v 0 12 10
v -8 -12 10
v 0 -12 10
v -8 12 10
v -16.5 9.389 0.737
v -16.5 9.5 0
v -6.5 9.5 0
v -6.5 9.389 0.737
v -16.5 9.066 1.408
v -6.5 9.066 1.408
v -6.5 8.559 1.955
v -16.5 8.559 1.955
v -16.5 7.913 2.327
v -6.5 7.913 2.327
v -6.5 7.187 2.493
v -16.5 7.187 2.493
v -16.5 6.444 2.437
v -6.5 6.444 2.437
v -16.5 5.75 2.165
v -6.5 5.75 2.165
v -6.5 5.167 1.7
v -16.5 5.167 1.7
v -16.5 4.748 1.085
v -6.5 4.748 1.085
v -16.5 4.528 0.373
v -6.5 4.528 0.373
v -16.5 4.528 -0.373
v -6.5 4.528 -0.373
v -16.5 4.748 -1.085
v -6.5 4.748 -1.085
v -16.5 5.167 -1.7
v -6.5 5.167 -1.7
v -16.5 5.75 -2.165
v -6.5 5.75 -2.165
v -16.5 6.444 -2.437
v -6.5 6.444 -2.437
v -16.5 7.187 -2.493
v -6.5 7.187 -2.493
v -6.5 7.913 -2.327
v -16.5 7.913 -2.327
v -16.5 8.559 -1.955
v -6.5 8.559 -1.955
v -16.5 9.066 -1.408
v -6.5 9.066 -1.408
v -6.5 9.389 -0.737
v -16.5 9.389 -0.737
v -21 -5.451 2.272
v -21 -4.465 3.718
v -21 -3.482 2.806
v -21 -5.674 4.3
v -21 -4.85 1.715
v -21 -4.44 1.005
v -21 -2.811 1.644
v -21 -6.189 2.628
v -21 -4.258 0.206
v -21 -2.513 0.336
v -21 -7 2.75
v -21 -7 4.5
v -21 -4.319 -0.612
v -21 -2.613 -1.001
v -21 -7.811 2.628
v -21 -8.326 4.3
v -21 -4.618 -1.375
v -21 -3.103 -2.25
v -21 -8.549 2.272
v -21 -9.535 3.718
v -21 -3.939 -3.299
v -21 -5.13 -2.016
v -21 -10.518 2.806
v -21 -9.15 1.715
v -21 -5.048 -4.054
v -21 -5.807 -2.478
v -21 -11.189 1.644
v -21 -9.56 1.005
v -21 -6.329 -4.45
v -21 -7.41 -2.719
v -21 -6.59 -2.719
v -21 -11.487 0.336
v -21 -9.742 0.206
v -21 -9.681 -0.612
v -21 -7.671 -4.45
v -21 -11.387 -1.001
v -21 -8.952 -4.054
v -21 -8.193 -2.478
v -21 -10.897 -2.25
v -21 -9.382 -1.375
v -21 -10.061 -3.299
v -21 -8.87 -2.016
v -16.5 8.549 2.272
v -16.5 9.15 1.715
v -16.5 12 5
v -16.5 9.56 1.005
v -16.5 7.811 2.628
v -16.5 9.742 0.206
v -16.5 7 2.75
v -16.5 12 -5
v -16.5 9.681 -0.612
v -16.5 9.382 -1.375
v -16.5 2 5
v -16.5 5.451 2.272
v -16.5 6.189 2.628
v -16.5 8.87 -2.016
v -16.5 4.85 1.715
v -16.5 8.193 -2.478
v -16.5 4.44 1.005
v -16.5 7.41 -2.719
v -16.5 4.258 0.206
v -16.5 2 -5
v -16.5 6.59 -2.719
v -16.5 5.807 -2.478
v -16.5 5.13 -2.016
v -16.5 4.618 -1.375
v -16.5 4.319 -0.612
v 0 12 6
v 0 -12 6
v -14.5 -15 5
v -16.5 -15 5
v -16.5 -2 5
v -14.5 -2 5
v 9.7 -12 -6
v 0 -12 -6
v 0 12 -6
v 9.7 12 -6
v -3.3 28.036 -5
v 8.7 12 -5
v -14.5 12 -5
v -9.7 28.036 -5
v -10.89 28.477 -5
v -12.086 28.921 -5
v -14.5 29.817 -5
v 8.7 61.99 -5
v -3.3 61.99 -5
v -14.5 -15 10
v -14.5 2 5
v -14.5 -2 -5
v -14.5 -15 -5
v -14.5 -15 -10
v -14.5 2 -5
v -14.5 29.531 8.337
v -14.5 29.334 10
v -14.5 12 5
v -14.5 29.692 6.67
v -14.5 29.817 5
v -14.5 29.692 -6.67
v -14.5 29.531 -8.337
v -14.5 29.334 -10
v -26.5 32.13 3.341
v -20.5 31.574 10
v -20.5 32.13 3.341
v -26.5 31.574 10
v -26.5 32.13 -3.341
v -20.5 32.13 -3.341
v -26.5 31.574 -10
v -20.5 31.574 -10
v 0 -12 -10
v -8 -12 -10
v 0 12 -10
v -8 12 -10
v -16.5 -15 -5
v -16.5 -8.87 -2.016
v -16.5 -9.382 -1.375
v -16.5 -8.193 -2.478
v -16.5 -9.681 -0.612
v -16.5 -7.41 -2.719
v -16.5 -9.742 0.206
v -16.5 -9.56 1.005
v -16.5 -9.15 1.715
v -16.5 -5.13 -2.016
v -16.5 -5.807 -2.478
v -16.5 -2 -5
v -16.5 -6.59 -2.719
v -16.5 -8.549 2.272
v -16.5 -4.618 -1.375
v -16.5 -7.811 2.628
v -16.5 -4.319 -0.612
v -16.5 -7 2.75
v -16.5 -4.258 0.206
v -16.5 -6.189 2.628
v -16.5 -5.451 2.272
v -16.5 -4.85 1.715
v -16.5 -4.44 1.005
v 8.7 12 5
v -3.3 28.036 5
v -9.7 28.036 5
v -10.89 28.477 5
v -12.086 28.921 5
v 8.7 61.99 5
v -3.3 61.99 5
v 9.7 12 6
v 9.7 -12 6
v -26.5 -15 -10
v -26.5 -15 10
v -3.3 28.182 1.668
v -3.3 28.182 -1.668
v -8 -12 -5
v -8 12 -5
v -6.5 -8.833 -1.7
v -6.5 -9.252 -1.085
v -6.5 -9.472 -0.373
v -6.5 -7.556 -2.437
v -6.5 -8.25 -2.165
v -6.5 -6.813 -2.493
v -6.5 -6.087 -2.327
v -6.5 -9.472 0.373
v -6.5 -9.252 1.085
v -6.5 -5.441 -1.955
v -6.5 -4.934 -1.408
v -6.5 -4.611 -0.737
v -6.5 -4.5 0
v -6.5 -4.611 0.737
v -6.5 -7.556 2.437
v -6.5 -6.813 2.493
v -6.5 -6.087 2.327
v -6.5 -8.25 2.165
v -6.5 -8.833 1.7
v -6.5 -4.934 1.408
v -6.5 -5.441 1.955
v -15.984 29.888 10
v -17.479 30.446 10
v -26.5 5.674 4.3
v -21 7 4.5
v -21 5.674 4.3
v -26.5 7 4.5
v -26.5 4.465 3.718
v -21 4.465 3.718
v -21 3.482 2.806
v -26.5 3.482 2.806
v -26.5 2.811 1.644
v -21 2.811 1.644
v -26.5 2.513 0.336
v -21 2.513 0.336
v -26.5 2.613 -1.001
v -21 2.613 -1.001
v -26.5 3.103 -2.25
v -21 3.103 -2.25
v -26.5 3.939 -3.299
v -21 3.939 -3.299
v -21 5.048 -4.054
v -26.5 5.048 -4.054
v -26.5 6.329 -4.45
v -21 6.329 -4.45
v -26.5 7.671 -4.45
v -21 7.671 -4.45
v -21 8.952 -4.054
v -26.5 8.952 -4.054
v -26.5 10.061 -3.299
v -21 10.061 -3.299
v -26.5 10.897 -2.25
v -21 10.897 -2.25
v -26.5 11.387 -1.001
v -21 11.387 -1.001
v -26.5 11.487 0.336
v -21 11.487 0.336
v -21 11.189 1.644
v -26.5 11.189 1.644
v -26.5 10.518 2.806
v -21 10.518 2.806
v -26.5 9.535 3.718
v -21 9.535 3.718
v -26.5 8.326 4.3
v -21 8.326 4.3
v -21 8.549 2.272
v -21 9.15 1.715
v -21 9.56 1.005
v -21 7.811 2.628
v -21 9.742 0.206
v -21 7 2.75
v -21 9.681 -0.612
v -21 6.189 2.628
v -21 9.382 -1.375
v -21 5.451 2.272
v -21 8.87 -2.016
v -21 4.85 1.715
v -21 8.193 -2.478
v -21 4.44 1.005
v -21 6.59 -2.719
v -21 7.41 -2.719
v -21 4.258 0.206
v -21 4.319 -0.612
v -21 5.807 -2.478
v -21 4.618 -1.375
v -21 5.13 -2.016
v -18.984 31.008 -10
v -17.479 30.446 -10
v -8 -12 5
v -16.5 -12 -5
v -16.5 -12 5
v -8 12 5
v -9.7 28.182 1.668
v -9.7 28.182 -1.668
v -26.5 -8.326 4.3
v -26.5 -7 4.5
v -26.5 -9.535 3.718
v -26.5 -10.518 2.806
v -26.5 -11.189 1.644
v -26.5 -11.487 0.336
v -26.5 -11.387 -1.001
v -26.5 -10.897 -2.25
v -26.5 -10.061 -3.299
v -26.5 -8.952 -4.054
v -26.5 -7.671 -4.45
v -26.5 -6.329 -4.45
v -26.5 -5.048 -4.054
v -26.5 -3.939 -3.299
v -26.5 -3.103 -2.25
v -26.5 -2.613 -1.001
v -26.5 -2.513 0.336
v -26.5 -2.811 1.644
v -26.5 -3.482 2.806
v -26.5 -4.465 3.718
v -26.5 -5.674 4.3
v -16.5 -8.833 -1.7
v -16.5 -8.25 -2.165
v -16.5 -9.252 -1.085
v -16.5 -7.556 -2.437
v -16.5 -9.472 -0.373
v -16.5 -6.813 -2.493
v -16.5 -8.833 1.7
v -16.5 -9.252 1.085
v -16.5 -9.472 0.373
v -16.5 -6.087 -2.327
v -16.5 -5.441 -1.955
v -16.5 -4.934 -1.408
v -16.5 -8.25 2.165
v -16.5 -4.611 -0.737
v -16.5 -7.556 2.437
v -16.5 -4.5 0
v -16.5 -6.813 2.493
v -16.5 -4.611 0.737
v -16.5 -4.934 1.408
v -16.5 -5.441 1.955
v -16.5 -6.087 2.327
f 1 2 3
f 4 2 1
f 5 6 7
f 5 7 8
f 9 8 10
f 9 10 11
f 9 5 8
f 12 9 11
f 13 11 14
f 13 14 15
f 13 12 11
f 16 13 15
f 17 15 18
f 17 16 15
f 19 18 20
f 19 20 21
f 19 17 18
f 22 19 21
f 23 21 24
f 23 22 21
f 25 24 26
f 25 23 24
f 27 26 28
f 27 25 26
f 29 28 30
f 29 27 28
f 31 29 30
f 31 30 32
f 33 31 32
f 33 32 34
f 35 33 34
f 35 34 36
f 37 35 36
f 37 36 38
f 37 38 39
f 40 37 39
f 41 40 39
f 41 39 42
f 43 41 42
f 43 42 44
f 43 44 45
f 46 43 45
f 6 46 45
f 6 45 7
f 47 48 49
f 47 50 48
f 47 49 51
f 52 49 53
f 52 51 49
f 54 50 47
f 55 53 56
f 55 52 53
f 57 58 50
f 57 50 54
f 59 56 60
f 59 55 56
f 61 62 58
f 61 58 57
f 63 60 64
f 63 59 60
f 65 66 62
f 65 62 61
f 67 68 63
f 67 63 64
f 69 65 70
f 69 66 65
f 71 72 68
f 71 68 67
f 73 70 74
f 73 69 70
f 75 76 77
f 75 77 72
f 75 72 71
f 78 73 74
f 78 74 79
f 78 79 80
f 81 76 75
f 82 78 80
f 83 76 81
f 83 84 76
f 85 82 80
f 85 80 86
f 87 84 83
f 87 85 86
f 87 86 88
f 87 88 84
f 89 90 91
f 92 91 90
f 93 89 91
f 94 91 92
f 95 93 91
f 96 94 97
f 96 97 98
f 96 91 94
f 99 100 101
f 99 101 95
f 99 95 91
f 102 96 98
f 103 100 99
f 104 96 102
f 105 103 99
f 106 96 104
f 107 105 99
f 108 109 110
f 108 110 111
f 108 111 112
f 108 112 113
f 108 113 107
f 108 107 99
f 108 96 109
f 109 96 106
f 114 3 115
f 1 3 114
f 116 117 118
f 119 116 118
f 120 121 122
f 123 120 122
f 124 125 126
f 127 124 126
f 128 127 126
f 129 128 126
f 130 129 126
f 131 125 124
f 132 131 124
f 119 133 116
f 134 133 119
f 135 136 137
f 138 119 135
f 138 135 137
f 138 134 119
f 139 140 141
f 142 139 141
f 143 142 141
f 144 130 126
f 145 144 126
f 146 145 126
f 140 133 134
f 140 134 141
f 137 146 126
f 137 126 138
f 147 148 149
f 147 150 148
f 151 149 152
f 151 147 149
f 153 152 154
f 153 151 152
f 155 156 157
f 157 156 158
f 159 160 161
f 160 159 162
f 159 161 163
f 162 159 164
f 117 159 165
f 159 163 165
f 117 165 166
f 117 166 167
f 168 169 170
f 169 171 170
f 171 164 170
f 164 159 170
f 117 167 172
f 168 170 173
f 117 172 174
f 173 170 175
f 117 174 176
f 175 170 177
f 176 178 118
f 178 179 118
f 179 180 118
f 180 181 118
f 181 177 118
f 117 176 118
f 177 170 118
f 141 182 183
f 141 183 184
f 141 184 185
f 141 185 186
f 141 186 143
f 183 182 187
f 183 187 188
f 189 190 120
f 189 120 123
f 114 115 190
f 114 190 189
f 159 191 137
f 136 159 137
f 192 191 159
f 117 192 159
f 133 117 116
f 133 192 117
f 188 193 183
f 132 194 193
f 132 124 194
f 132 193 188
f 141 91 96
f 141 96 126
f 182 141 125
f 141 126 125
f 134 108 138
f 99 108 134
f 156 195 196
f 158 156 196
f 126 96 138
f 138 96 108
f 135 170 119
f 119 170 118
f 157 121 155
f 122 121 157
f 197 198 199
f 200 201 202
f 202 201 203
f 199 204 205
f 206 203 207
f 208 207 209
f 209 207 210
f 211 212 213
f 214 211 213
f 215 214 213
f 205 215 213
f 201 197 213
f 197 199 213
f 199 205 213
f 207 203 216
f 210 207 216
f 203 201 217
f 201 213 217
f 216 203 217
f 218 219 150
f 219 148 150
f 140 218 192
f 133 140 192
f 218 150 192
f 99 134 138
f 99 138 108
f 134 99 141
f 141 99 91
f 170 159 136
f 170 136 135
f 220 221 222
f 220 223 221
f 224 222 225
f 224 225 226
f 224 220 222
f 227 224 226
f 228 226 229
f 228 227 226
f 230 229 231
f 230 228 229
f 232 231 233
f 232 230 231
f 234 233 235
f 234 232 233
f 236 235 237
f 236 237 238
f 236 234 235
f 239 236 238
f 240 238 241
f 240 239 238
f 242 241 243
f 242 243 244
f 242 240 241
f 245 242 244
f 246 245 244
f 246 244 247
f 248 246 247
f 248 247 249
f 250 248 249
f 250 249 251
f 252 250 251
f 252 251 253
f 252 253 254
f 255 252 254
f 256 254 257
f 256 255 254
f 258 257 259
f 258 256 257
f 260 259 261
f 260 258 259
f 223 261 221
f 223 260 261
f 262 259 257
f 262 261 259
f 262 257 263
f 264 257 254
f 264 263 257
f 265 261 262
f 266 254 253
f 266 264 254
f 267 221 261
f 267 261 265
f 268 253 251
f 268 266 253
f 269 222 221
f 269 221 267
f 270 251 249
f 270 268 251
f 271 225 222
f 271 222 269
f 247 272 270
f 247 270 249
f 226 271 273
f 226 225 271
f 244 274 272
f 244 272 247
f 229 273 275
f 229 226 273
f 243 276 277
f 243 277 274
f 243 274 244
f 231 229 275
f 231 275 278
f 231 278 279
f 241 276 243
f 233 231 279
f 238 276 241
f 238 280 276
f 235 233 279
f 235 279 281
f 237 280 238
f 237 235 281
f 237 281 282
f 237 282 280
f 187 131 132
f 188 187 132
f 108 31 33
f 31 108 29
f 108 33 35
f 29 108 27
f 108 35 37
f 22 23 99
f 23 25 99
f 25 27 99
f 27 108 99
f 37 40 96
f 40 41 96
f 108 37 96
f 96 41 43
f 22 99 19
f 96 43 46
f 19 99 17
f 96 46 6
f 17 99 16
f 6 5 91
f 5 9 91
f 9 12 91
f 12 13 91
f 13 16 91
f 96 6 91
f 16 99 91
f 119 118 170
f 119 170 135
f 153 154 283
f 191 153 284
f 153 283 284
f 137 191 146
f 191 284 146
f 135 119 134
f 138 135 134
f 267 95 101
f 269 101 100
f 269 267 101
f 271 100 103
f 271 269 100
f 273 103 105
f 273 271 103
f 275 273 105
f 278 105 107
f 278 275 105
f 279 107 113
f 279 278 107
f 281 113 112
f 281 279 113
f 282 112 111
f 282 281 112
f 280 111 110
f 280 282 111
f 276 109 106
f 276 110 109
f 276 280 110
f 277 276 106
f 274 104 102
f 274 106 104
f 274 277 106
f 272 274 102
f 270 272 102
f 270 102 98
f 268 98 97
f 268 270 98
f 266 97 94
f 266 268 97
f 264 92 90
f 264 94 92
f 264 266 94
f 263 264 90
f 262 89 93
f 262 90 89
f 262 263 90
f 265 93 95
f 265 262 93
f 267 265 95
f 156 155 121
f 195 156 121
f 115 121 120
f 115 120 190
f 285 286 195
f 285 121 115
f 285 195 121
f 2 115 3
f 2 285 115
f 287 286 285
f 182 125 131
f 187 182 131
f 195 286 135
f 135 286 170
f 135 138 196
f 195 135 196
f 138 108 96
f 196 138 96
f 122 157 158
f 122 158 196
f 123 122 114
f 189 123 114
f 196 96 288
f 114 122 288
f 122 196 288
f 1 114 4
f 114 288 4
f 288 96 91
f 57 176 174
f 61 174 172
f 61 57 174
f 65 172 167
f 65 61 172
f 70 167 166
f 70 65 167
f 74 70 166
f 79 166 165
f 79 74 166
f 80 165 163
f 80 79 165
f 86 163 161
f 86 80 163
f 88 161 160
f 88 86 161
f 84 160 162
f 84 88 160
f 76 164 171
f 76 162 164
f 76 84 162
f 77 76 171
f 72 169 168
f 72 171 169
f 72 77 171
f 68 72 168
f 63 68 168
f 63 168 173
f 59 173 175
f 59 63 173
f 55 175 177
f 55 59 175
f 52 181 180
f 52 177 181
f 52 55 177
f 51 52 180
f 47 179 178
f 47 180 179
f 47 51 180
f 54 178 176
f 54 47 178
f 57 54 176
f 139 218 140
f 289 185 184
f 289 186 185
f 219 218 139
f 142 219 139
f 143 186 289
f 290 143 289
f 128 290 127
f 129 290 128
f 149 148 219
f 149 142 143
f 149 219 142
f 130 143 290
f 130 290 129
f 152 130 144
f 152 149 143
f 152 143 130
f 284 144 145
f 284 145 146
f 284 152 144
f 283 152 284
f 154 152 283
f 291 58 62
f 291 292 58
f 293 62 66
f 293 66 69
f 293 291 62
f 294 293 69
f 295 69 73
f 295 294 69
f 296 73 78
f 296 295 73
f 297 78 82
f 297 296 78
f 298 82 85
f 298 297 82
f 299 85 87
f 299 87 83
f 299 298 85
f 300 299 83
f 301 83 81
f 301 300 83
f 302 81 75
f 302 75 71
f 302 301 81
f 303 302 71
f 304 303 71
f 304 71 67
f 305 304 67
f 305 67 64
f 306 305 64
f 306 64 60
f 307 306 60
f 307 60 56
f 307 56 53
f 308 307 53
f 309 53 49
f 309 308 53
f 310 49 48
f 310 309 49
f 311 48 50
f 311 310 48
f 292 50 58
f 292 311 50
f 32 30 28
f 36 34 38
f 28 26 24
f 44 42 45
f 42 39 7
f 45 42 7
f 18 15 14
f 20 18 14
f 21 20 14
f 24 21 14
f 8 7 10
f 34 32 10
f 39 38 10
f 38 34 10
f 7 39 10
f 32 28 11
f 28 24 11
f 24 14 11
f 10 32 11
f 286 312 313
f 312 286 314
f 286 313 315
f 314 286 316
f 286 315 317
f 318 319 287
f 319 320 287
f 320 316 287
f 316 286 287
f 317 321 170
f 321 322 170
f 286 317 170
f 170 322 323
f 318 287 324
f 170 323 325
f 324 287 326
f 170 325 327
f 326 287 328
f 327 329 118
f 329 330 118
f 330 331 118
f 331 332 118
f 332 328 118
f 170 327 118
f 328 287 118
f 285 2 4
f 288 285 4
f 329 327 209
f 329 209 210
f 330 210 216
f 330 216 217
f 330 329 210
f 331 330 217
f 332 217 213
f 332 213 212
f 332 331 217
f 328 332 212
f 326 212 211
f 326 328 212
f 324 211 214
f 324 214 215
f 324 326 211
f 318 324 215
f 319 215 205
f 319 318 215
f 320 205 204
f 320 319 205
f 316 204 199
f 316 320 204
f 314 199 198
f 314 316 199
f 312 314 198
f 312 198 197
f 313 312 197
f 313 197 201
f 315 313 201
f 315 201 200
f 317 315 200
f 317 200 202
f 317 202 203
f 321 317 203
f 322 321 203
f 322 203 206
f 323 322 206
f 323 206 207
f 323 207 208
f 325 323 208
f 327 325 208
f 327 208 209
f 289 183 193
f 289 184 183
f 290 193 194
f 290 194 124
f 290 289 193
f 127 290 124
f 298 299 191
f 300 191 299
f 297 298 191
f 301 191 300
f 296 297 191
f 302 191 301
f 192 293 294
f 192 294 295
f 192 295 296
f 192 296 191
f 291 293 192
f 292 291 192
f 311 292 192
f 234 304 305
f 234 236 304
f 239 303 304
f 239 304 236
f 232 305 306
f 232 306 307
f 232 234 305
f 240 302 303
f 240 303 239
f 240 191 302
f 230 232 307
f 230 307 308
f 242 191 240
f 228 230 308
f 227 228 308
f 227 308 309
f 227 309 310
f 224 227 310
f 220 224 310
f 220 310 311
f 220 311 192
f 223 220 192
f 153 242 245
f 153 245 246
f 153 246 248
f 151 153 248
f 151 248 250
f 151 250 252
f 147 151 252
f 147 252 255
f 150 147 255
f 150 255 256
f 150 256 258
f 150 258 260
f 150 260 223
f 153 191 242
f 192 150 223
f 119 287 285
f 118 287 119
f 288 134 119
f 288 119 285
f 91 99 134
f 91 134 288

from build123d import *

# Parameters (mm, degrees)
MHSL3_50D_MHSL_FINGER_START       = -14.5
MHSL3_50D_MHSL_FINGER_OUTLINE_W   = 24
MHSL3_50D_MHSL_FINGER_OUTLINE_H   = 10
MHSL3_50D_MHSL_FINGER_OUTLINE_R   = 2.5
MHSL3_50D_MHSL_FINGER_DEPTH       = 24.2
MHSL3_50D_MHSL_FINGER_START_2     = -8
MHSL3_50D_MHSL_FINGER_2_OUTLINE_W = 24
MHSL3_50D_MHSL_FINGER_2_OUTLINE_H = 5
MHSL3_50D_MHSL_FINGER_2_DEPTH     = 8
MHSL3_50D_MHSL_FINGER_START_3     = -6.5
MHSL3_50D_MHSL_FINGER_3_OUTLINE_W = 24
MHSL3_50D_MHSL_FINGER_3_OUTLINE_H = 1
MHSL3_50D_MHSL_FINGER_3_OUTLINE_R = 2.5
MHSL3_50D_MHSL_FINGER_3_DEPTH     = 16.2
MHSL3_50D_MHSL_FINGER_START_4     = -16.5
MHSL3_50D_MHSL_FINGER_4_OUTLINE_W = 10
MHSL3_50D_MHSL_FINGER_4_OUTLINE_H = 10
MHSL3_50D_MHSL_FINGER_4_OUTLINE_R = 2.5
MHSL3_50D_MHSL_FINGER_4_DEPTH     = 2
BOSS_EXTRUDE2_DEPTH               = 5
BOSS_EXTRUDE2_DEPTH_BACK          = 5
CBORE_FOR_M5_SHCS5_AT_2_COUNT     = 2
CBORE_FOR_M5_SHCS5_AT_2_PITCH     = 14
BOSS_EXTRUDE3_DEPTH               = 10
BOSS_EXTRUDE4_DEPTH               = 5
SKETCH18_W                        = 10
SKETCH18_H                        = 20
BOSS_EXTRUDE5_DEPTH               = 3
SKETCH21_W                        = 5
SKETCH21_H                        = 13
BOSS_EXTRUDE7_DEPTH               = 2


# Read off the part's stored shape, not the designer's step: MHSL3-50D_MHSL-Finger
with BuildPart() as part:
    # MHSL3-50D_MHSL-Finger outline → MHSL3-50D_MHSL-Finger (new body)
    with BuildSketch(Plane.YZ.offset(MHSL3_50D_MHSL_FINGER_START)):
        Rectangle(MHSL3_50D_MHSL_FINGER_OUTLINE_W, MHSL3_50D_MHSL_FINGER_OUTLINE_H)
        with Locations((7, 0)):
            Circle(MHSL3_50D_MHSL_FINGER_OUTLINE_R, mode=Mode.SUBTRACT)
        with Locations((-7, 0)):
            Circle(MHSL3_50D_MHSL_FINGER_OUTLINE_R, mode=Mode.SUBTRACT)
    extrude(amount=MHSL3_50D_MHSL_FINGER_DEPTH)



with BuildPart() as body_2:
    # MHSL3-50D_MHSL-Finger 2 outline → MHSL3-50D_MHSL-Finger 2 (new body)
    with BuildSketch(Plane.YZ.offset(MHSL3_50D_MHSL_FINGER_START_2)):
        with Locations((0, 7.5)):
            Rectangle(MHSL3_50D_MHSL_FINGER_2_OUTLINE_W, MHSL3_50D_MHSL_FINGER_2_OUTLINE_H)
        with Locations((0, -7.5)):
            Rectangle(MHSL3_50D_MHSL_FINGER_2_OUTLINE_W, MHSL3_50D_MHSL_FINGER_2_OUTLINE_H)
    extrude(amount=MHSL3_50D_MHSL_FINGER_2_DEPTH)


with BuildPart() as part_1:
    add(part.part)

    add(body_2.part)  # MHSL3-50D_MHSL-Finger 3 merges body 2
    # MHSL3-50D_MHSL-Finger 3 outline → MHSL3-50D_MHSL-Finger 3 (add)
    with BuildSketch(Plane.YZ.offset(MHSL3_50D_MHSL_FINGER_START_3)):
        with Locations((0, 5.5)):
            Rectangle(MHSL3_50D_MHSL_FINGER_3_OUTLINE_W, MHSL3_50D_MHSL_FINGER_3_OUTLINE_H)
        with Locations((0, -5.5)):
            Rectangle(MHSL3_50D_MHSL_FINGER_3_OUTLINE_W, MHSL3_50D_MHSL_FINGER_3_OUTLINE_H)
        with Locations((7, 0)):
            Circle(MHSL3_50D_MHSL_FINGER_3_OUTLINE_R)
        with Locations((-7, 0)):
            Circle(MHSL3_50D_MHSL_FINGER_3_OUTLINE_R)
    extrude(amount=MHSL3_50D_MHSL_FINGER_3_DEPTH)

    # MHSL3-50D_MHSL-Finger 4 outline → MHSL3-50D_MHSL-Finger 4 (add)
    # profile 1 of 2: a face of its own
    with BuildSketch(Plane.YZ.offset(MHSL3_50D_MHSL_FINGER_START_4)):
        with Locations((7, 0)):
            Rectangle(MHSL3_50D_MHSL_FINGER_4_OUTLINE_W, MHSL3_50D_MHSL_FINGER_4_OUTLINE_H)
        with Locations((7, 0)):
            Circle(MHSL3_50D_MHSL_FINGER_4_OUTLINE_R, mode=Mode.SUBTRACT)
    # profile 2 of 2: a face of its own
    with BuildSketch(Plane.YZ.offset(MHSL3_50D_MHSL_FINGER_START_4)):
        with Locations((-7, 0)):
            Rectangle(MHSL3_50D_MHSL_FINGER_4_OUTLINE_W, MHSL3_50D_MHSL_FINGER_4_OUTLINE_H)
        with Locations((-7, 0)):
            Circle(MHSL3_50D_MHSL_FINGER_4_OUTLINE_R, mode=Mode.SUBTRACT)
    extrude(amount=MHSL3_50D_MHSL_FINGER_4_DEPTH)


with BuildPart() as body_2_2:
    # Sketch2 → Boss-Extrude2 (new, two sides: drawn at the far end of the back side and taken through both)
    with BuildSketch(Plane.XY.offset(-BOSS_EXTRUDE2_DEPTH_BACK)):
        Polygon((-16.5, -4.5), (-16.5, -2), (-14.5, -2), (-14.5, 2), (-16.5, 2), (-16.5, 4.5), (-16.5, 9.5), (-16.5, 12), (8.7, 12), (8.7, 61.989999), (-3.3, 61.989999), (-3.3, 28.2), (-26.5, 28.2), (-26.5, -12), (-16.5, -12), (-16.5, -9.5), align=None)
    extrude(amount=BOSS_EXTRUDE2_DEPTH + BOSS_EXTRUDE2_DEPTH_BACK)

    # Sketch14 → CBORE for M5 SHCS5 (revolve, cut)
    with BuildSketch(Plane(origin=(-26.5, 7, 0), x_dir=(0, 0, 1), z_dir=(0, 1, 0))):
        Polygon((0, 0), (0, 36.2), (2.75, 36.2), (2.75, 5.5), (4.5, 5.5), (4.5, 0), align=None)
    cbore_for_m5_shcs5 = revolve(axis=Axis((-32.85, 7, 0), (1, 0, 0)), mode=Mode.SUBTRACT)

    # CBORE for M5 SHCS5 at 2: CBORE for M5 SHCS5 ×2
    with Locations(*[(0, -i * CBORE_FOR_M5_SHCS5_AT_2_PITCH, 0) for i in range(1, CBORE_FOR_M5_SHCS5_AT_2_COUNT)]):
        add(cbore_for_m5_shcs5, mode=Mode.SUBTRACT)

    # Sketch15 → Boss-Extrude3 (add)
    with BuildSketch(Plane(origin=(0, 0, -5), x_dir=(-1, 0, 0), z_dir=(0, 0, -1))):
        Polygon((26.5, 28.2), (26.5, 32.2), (20.5, 32.2), (9.7, 28.2), align=None)
    extrude(amount=-BOSS_EXTRUDE3_DEPTH)

    # Sketch16 → Boss-Extrude4 (add)
    with BuildSketch(Plane(origin=(0, 0, -5), x_dir=(-1, 0, 0), z_dir=(0, 0, -1))):
        Polygon((26.5, -12), (16.5, -12), (16.5, -2), (14.5, -2), (14.5, 2), (16.5, 2), (16.5, 12), (16.5, 30.718518519), (20.5, 32.2), (26.5, 32.2), align=None)
    boss_extrude4 = extrude(amount=BOSS_EXTRUDE4_DEPTH)

    # Mirror1: Boss-Extrude4 across plane
    add(boss_extrude4.mirror(Plane.XY))

    # Sketch18 → Boss-Extrude5 (add)
    with BuildSketch(Plane.XZ.offset(12)):
        with Locations((-21.5, 0)):
            Rectangle(SKETCH18_W, SKETCH18_H)
    extrude(amount=BOSS_EXTRUDE5_DEPTH)

    # Sketch21 → Boss-Extrude7 (add)
    with BuildSketch(Plane(origin=(-16.5, 0, 0), x_dir=(0, 0, -1), z_dir=(1, 0, 0))):
        Polygon((-5, 30.718518519), (-10, 30.718518519), (-10, 2), (-5, 2), (-5, 12), align=None)
        Polygon((5, 12), (5, 2), (10, 2), (10, 30.718518519), (5, 30.718518519), align=None)
        with Locations((7.5, -8.5)):
            Rectangle(SKETCH21_W, SKETCH21_H)
        with Locations((-7.5, -8.5)):
            Rectangle(SKETCH21_W, SKETCH21_H)
    extrude(amount=BOSS_EXTRUDE7_DEPTH)

    # Sketch17 → Cut-Revolve1 (revolve, cut)
    with BuildSketch(Plane.XY):
        Polygon((-9.7, 28.2), (-20.5, 32.2), (-26.5, 32.2), (-26.5, 48.976180053), (-3.3, 48.976180053), (-3.3, 28.2), align=None)
    revolve(axis=Axis((-3.3, -48, 0), (-1, 0, 0)), mode=Mode.SUBTRACT)


solid = Compound([part_1.part, body_2_2.part])
